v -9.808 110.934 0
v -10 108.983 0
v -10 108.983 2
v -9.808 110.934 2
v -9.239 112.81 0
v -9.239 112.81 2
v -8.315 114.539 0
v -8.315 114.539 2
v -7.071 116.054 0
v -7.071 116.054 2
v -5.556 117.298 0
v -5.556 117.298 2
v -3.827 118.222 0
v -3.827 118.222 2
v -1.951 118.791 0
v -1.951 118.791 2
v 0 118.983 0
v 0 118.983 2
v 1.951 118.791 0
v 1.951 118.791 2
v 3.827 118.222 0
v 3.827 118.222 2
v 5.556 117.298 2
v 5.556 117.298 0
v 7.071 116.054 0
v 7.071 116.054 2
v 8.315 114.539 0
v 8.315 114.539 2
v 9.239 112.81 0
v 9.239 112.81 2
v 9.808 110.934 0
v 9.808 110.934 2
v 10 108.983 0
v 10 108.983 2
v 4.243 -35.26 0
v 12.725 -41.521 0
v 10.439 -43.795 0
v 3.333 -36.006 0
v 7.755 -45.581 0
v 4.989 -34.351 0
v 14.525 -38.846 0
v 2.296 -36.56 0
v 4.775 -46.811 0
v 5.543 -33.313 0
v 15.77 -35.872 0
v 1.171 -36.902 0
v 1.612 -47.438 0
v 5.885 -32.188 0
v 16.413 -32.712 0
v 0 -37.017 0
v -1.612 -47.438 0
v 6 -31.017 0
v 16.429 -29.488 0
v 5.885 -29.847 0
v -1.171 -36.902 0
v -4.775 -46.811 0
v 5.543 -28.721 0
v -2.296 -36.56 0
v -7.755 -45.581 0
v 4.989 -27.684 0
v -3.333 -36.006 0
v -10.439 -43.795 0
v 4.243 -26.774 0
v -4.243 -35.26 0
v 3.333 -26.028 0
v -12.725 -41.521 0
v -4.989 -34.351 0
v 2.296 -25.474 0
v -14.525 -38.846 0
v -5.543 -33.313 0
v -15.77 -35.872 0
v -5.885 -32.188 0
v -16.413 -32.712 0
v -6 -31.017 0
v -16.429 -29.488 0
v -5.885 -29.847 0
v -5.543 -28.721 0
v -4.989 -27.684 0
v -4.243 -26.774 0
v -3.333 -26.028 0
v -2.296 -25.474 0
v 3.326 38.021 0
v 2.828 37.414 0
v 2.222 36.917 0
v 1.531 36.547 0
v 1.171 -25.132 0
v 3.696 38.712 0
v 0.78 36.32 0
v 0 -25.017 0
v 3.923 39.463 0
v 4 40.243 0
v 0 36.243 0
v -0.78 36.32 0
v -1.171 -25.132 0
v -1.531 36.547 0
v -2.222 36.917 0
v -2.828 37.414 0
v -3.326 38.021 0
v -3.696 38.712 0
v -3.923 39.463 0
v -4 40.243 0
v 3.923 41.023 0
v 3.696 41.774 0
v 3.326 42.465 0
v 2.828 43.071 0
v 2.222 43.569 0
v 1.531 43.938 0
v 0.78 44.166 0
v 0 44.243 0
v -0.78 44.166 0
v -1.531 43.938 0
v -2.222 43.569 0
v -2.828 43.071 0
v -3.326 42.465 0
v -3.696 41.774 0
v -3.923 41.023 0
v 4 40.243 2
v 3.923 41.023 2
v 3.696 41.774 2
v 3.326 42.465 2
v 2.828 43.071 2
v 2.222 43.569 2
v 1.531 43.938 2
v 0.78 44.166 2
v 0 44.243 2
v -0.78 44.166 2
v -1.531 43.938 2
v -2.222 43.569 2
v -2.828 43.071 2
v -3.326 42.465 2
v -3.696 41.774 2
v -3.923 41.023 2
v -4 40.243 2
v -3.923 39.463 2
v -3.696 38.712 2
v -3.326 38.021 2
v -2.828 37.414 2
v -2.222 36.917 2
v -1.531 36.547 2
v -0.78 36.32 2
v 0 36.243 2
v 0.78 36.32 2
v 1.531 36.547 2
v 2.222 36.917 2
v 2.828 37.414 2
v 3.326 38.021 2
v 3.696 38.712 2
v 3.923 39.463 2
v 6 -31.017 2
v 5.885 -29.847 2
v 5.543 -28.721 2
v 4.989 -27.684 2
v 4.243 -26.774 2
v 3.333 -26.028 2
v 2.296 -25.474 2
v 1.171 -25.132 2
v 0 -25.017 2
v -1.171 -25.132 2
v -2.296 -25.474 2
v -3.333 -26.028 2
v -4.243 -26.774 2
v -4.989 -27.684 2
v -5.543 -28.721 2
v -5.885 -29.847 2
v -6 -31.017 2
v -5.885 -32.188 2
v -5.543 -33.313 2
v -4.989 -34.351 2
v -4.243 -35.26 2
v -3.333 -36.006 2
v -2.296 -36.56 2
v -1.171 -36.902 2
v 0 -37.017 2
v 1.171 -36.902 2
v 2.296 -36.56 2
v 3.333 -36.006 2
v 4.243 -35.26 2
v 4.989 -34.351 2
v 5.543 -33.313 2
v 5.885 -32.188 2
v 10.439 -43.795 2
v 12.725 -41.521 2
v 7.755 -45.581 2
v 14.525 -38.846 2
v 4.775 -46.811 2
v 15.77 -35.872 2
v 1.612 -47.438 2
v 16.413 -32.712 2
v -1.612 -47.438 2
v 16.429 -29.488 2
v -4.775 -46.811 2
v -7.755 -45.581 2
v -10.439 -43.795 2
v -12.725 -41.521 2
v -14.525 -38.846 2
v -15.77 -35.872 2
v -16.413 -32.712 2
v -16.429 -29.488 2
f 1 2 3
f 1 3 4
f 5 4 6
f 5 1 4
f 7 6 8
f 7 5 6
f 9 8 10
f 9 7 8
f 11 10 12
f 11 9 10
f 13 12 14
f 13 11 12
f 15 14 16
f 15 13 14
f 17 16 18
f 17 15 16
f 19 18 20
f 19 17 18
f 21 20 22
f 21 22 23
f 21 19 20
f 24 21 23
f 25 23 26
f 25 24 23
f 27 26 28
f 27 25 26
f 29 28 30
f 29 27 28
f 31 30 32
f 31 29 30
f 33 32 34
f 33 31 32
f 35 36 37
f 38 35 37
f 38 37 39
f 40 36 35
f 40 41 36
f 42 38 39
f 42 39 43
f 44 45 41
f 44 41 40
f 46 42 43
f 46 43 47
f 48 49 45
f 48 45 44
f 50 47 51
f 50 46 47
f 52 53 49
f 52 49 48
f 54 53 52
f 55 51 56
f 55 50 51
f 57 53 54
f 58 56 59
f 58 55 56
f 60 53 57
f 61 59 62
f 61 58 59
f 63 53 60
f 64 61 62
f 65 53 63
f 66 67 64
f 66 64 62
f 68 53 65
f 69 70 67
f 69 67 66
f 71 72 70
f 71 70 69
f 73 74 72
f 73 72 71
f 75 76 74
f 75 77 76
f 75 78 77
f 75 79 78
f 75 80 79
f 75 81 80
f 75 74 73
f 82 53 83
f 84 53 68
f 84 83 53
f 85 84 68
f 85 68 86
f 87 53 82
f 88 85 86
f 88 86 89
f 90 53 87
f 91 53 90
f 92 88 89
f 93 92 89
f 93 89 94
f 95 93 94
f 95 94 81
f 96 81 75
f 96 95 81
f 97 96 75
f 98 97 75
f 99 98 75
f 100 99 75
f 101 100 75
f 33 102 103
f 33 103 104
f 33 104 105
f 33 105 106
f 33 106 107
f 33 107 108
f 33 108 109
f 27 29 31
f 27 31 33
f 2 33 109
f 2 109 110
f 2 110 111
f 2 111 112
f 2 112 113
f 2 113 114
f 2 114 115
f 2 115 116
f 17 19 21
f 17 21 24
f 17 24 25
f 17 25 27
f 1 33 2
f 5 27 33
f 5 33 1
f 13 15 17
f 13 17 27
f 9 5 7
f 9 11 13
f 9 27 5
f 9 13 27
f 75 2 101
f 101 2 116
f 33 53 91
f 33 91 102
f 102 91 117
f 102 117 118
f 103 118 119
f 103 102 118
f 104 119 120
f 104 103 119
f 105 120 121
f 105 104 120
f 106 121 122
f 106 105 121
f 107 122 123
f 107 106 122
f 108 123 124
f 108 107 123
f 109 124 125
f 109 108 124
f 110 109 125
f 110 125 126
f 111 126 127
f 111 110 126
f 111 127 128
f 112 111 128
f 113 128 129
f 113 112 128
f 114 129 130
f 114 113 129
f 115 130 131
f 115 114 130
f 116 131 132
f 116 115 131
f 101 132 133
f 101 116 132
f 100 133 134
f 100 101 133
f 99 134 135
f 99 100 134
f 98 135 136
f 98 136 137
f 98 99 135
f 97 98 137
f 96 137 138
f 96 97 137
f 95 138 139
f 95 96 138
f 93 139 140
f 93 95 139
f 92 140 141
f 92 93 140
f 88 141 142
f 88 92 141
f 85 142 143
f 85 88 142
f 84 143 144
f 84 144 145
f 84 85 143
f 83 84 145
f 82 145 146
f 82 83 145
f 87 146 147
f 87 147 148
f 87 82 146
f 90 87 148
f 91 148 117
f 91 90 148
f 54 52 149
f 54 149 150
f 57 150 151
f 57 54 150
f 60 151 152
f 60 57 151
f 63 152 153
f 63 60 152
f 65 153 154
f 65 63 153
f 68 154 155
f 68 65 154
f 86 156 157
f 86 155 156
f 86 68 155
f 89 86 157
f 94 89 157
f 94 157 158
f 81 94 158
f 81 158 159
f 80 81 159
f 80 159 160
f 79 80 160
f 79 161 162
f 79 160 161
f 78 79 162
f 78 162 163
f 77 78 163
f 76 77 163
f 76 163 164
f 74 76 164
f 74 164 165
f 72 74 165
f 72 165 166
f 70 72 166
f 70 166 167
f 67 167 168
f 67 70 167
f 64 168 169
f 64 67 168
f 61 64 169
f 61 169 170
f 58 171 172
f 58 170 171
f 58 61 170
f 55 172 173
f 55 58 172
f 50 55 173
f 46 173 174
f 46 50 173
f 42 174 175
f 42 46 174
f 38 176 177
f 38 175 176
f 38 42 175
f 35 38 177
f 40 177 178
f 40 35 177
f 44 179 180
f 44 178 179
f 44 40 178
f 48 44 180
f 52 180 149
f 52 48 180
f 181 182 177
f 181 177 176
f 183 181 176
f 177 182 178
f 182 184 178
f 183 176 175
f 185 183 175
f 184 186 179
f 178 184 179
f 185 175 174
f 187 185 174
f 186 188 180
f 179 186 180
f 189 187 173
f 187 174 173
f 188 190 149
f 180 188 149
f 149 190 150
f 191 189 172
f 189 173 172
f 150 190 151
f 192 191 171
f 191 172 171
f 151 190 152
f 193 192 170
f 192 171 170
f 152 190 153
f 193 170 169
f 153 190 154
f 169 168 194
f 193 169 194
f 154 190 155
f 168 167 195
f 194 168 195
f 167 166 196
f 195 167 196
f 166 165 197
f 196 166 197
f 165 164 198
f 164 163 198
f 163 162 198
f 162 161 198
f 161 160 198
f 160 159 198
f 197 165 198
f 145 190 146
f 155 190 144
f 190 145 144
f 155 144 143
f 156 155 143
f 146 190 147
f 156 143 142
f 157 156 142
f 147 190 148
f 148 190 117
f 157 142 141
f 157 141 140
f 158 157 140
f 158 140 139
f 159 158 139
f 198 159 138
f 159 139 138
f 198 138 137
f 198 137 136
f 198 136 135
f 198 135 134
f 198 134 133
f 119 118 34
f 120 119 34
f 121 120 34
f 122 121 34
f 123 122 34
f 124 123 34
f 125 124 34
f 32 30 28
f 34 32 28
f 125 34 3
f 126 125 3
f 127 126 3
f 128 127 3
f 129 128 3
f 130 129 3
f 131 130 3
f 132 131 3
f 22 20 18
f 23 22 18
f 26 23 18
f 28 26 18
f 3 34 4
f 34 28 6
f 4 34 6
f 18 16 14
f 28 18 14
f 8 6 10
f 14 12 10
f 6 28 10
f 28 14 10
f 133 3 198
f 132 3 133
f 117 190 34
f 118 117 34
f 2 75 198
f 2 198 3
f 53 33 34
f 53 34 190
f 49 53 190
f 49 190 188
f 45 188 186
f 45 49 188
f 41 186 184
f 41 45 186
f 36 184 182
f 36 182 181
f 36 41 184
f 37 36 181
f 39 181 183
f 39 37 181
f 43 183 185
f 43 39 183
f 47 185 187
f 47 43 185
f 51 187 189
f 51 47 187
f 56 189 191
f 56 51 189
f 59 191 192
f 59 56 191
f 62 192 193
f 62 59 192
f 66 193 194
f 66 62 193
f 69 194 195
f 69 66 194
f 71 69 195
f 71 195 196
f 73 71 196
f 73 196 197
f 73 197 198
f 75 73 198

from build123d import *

# Parameters (mm, degrees)
SKETCH1_R               = 4
BOSS_EXTRUDE1_DEPTH     = 2
CUT_EXTRUDE1_DEPTH      = 121.138144992
CUT_EXTRUDE1_DEPTH_BACK = 121.138144992
SKETCH2_R               = 6


with BuildPart() as part:
    # Sketch1 → Boss-Extrude1 (new body)
    with BuildSketch(Plane.XY):
        with BuildLine():
            Line((-16.429017806, -29.488280523), (-10, 108.982872222))
            ThreePointArc((-10, 108.982872222), (0, 118.982872222), (10, 108.982872222))
            Line((10, 108.982872222), (16.429017806, -29.488280523))
            ThreePointArc((16.429017806, -29.488280523), (0, -47.517127778), (-16.429017806, -29.488280523))
        make_face()
        with Locations((0, 40.242872222)):
            Circle(SKETCH1_R, mode=Mode.SUBTRACT)
    extrude(amount=BOSS_EXTRUDE1_DEPTH)

    # Sketch2 → Cut-Extrude1 (cut, two sides: drawn at the far end of the back side and taken through both)
    with BuildSketch(Plane.XY.offset(2).offset(-CUT_EXTRUDE1_DEPTH_BACK)):
        with Locations((0, -31.017127778)):
            Circle(SKETCH2_R)
    extrude(amount=CUT_EXTRUDE1_DEPTH + CUT_EXTRUDE1_DEPTH_BACK, mode=Mode.SUBTRACT)


solid = part.part
